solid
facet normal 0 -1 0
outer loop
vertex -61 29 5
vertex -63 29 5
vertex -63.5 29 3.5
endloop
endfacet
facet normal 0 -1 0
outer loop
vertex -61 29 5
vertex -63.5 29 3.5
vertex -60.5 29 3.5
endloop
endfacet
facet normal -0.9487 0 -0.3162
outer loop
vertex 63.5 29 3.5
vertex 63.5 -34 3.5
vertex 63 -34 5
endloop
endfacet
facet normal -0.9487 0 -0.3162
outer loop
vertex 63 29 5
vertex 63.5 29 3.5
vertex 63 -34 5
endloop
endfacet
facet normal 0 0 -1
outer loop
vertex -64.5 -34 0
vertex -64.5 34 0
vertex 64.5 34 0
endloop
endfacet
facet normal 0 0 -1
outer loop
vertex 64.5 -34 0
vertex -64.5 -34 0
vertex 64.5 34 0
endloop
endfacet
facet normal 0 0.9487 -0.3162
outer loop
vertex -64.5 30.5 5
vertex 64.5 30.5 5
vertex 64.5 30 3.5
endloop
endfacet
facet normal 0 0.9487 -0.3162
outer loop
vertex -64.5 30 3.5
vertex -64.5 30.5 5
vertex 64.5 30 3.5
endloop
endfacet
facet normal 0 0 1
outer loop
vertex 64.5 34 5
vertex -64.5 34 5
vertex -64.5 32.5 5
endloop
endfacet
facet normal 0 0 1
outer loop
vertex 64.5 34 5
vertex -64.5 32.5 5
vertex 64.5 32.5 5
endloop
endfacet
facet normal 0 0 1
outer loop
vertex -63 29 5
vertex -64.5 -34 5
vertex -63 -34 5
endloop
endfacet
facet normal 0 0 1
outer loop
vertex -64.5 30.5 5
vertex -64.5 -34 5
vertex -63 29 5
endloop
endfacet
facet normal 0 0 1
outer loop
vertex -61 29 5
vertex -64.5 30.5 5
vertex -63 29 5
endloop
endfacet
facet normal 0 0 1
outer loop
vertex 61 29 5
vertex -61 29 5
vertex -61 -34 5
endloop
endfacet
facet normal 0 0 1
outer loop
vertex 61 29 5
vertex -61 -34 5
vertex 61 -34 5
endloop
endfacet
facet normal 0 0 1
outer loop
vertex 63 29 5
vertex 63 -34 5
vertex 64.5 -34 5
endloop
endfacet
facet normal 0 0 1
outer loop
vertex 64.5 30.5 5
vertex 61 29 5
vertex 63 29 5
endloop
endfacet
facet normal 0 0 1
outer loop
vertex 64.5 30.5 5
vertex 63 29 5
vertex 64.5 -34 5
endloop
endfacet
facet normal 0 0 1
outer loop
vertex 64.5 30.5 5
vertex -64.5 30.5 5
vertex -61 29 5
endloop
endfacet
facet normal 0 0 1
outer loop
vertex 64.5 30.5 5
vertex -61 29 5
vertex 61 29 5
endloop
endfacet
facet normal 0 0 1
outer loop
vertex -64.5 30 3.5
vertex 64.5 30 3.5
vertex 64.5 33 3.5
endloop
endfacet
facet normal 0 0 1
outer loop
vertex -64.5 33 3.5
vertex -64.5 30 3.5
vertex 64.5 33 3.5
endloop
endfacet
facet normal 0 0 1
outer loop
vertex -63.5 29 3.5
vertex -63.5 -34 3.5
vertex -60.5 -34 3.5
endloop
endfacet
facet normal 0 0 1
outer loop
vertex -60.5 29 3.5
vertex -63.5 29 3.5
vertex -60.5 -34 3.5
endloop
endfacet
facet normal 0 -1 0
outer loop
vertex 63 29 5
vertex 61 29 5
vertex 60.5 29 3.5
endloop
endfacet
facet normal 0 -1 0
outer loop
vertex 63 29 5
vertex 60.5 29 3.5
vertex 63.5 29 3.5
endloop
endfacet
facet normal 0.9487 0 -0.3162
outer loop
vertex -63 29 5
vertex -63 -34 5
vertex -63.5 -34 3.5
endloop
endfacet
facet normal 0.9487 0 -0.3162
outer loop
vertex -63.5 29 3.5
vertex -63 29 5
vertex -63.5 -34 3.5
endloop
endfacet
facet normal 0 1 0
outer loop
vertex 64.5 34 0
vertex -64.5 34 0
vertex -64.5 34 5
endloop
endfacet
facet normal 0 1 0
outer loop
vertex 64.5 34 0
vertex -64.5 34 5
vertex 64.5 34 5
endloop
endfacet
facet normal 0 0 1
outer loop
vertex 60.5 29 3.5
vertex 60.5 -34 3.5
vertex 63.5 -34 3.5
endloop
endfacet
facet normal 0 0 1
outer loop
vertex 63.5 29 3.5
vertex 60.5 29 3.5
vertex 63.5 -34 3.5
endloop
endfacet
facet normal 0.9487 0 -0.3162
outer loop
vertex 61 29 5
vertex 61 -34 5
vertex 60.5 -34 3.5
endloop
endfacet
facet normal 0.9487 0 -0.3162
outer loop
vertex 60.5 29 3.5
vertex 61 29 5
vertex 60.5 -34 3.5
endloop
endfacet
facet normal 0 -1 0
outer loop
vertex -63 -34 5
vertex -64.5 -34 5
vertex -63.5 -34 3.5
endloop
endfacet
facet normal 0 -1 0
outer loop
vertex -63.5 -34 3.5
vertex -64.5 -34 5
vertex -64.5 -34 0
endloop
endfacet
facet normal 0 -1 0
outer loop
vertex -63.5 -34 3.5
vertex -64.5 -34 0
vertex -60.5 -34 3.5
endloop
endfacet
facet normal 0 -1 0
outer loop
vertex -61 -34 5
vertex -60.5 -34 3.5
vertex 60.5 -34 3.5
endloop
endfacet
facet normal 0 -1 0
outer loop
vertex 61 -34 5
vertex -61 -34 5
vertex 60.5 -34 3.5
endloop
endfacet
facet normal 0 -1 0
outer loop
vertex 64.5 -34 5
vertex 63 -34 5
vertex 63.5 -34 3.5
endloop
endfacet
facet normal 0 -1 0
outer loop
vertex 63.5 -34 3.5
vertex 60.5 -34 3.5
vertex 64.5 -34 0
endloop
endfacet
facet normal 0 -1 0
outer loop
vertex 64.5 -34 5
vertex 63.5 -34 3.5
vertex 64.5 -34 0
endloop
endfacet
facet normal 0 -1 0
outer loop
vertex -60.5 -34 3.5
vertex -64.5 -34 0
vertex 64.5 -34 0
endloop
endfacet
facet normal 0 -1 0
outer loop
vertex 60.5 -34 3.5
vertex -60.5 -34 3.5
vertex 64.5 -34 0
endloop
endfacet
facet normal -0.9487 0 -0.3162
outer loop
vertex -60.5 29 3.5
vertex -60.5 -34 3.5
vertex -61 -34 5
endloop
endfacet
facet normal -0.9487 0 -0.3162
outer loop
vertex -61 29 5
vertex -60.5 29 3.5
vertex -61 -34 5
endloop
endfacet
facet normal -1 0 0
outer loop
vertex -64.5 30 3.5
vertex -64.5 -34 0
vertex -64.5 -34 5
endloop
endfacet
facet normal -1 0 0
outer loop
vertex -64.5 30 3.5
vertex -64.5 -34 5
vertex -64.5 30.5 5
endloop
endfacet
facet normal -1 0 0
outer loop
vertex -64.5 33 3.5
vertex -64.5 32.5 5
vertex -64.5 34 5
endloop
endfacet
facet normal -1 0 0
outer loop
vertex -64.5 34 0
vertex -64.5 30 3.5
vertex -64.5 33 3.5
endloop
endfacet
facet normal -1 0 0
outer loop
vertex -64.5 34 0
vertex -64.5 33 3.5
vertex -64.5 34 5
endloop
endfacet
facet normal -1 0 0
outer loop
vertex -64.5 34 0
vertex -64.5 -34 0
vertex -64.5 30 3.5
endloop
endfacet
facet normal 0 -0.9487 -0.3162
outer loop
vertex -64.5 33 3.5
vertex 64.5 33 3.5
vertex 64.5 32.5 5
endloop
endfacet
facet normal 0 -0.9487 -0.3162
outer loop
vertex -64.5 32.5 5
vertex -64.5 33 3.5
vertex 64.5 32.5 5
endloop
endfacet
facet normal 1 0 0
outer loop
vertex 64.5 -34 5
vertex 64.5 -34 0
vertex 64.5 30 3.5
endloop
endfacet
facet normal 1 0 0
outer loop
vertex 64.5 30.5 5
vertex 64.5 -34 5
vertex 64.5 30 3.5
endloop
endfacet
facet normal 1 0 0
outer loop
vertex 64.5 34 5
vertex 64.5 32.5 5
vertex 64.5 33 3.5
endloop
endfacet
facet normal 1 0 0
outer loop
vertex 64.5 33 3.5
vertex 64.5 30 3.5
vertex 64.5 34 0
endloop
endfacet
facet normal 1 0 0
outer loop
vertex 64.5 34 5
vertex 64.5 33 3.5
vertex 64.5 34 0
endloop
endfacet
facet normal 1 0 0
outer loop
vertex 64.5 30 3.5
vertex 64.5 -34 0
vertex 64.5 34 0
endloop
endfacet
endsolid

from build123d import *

# Parameters (mm, degrees)
F0_W     = 129
F0_H     = 68
F1_DEPTH = 5
F3_DEPTH = 63
F5_DEPTH = 129.001


with BuildPart() as f1:
    # F0 (on Top) → F1 (new body)
    with BuildSketch(Plane.XY):
        Rectangle(F0_W, F0_H)
    extrude(amount=F1_DEPTH)

    # F2 (on face) → F3 (cut)
    with BuildSketch(Plane.XZ.offset(34)):
        Polygon((63, 5), (61, 5), (60.5, 3.5), (63.5, 3.5), align=None)
        Polygon((-61, 5), (-63, 5), (-63.5, 3.5), (-60.5, 3.5), align=None)
    extrude(amount=-F3_DEPTH, mode=Mode.SUBTRACT)

    # F4 (on face) → F5 (cut, through all)
    with BuildSketch(Plane.YZ.offset(64.5)):
        Polygon((33, 3.5), (32.5, 5), (30.5, 5), (30, 3.5), align=None)
    extrude(amount=-F5_DEPTH, mode=Mode.SUBTRACT)


solid = f1.part
